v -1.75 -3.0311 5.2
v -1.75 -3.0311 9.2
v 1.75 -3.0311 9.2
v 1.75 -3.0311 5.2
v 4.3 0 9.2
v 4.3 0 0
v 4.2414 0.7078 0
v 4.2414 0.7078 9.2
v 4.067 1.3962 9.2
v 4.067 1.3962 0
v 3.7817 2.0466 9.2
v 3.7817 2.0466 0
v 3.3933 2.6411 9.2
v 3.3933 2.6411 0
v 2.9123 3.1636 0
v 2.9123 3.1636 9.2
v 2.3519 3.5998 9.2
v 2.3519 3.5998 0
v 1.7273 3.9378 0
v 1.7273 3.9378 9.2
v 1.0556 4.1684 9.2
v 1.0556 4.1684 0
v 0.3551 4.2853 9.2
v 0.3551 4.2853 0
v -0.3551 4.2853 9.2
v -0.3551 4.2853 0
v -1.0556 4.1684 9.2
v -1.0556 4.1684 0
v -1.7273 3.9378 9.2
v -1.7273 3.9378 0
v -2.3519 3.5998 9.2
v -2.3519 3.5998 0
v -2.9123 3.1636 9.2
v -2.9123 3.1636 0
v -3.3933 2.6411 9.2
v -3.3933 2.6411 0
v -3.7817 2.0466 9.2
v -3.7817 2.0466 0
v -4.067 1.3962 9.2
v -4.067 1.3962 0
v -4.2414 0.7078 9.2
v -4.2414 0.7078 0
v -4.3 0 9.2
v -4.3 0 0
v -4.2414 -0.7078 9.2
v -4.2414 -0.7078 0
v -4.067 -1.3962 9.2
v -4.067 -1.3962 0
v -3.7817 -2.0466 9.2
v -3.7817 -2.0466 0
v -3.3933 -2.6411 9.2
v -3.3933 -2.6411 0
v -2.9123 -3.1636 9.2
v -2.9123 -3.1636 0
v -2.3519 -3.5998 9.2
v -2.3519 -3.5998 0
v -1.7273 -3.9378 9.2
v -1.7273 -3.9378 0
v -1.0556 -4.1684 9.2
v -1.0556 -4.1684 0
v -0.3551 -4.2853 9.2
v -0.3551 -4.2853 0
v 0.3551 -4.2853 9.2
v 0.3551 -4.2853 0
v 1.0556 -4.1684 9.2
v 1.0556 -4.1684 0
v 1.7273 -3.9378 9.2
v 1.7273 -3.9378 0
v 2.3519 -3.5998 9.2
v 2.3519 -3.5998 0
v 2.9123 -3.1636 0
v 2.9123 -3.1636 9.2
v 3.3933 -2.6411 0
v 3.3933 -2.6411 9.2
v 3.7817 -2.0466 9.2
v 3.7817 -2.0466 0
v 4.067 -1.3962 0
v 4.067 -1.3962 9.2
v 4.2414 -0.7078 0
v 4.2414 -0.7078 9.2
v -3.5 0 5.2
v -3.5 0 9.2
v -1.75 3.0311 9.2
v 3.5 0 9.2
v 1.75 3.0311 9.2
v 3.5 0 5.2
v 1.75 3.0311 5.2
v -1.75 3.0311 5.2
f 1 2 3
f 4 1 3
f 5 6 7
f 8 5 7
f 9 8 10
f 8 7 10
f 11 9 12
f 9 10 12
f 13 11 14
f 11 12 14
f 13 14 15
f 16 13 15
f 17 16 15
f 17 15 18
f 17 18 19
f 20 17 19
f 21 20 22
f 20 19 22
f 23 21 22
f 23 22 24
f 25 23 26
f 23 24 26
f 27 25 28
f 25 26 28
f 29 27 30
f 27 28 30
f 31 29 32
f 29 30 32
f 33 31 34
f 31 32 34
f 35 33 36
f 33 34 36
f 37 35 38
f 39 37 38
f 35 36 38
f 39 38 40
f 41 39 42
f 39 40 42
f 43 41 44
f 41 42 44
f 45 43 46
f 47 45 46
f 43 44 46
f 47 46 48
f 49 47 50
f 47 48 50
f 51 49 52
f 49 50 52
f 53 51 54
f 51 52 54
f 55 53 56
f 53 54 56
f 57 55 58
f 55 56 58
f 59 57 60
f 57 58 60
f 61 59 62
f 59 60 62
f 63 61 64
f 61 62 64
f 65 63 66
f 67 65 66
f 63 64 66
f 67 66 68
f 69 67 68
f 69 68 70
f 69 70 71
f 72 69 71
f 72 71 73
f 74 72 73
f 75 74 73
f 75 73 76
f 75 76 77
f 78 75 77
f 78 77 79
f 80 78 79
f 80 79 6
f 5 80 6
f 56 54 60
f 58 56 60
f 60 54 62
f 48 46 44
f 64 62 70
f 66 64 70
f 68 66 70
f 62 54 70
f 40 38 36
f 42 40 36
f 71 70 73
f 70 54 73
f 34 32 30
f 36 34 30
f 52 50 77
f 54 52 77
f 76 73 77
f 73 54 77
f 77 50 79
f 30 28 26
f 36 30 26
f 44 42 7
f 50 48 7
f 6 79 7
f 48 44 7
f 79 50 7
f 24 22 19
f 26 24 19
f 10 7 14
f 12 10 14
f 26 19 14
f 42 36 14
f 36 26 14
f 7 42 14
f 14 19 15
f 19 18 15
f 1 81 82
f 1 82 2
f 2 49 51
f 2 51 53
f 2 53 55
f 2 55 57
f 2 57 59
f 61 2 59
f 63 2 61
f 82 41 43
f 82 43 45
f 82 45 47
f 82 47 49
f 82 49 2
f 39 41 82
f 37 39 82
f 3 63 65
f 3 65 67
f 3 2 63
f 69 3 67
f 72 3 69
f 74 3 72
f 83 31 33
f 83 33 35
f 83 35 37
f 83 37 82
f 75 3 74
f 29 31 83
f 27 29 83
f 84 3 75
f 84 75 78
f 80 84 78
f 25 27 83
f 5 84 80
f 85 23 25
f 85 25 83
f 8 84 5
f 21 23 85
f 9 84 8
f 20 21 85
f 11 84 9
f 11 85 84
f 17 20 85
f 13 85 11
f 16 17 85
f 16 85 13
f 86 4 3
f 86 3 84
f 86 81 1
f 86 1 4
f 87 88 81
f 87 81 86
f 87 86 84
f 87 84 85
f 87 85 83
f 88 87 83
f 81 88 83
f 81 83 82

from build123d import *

# Parameters (mm, degrees)
SKETCH_R     = 4.3
PAD_DEPTH    = 9.2
POCKET_DEPTH = 4


with BuildPart() as part:
    # Sketch → Pad (new body)
    with BuildSketch(Plane.XY):
        Circle(SKETCH_R)
    extrude(amount=PAD_DEPTH)

    # Sketch003 → Pocket (cut)
    with BuildSketch(Plane.XY.offset(9.2)):
        Polygon((-3.5, 0), (-1.75, -3.031089), (1.75, -3.031089), (3.5, 0), (1.75, 3.031089), (-1.75, 3.031089), align=None)
    extrude(amount=-POCKET_DEPTH, mode=Mode.SUBTRACT)


solid = part.part
